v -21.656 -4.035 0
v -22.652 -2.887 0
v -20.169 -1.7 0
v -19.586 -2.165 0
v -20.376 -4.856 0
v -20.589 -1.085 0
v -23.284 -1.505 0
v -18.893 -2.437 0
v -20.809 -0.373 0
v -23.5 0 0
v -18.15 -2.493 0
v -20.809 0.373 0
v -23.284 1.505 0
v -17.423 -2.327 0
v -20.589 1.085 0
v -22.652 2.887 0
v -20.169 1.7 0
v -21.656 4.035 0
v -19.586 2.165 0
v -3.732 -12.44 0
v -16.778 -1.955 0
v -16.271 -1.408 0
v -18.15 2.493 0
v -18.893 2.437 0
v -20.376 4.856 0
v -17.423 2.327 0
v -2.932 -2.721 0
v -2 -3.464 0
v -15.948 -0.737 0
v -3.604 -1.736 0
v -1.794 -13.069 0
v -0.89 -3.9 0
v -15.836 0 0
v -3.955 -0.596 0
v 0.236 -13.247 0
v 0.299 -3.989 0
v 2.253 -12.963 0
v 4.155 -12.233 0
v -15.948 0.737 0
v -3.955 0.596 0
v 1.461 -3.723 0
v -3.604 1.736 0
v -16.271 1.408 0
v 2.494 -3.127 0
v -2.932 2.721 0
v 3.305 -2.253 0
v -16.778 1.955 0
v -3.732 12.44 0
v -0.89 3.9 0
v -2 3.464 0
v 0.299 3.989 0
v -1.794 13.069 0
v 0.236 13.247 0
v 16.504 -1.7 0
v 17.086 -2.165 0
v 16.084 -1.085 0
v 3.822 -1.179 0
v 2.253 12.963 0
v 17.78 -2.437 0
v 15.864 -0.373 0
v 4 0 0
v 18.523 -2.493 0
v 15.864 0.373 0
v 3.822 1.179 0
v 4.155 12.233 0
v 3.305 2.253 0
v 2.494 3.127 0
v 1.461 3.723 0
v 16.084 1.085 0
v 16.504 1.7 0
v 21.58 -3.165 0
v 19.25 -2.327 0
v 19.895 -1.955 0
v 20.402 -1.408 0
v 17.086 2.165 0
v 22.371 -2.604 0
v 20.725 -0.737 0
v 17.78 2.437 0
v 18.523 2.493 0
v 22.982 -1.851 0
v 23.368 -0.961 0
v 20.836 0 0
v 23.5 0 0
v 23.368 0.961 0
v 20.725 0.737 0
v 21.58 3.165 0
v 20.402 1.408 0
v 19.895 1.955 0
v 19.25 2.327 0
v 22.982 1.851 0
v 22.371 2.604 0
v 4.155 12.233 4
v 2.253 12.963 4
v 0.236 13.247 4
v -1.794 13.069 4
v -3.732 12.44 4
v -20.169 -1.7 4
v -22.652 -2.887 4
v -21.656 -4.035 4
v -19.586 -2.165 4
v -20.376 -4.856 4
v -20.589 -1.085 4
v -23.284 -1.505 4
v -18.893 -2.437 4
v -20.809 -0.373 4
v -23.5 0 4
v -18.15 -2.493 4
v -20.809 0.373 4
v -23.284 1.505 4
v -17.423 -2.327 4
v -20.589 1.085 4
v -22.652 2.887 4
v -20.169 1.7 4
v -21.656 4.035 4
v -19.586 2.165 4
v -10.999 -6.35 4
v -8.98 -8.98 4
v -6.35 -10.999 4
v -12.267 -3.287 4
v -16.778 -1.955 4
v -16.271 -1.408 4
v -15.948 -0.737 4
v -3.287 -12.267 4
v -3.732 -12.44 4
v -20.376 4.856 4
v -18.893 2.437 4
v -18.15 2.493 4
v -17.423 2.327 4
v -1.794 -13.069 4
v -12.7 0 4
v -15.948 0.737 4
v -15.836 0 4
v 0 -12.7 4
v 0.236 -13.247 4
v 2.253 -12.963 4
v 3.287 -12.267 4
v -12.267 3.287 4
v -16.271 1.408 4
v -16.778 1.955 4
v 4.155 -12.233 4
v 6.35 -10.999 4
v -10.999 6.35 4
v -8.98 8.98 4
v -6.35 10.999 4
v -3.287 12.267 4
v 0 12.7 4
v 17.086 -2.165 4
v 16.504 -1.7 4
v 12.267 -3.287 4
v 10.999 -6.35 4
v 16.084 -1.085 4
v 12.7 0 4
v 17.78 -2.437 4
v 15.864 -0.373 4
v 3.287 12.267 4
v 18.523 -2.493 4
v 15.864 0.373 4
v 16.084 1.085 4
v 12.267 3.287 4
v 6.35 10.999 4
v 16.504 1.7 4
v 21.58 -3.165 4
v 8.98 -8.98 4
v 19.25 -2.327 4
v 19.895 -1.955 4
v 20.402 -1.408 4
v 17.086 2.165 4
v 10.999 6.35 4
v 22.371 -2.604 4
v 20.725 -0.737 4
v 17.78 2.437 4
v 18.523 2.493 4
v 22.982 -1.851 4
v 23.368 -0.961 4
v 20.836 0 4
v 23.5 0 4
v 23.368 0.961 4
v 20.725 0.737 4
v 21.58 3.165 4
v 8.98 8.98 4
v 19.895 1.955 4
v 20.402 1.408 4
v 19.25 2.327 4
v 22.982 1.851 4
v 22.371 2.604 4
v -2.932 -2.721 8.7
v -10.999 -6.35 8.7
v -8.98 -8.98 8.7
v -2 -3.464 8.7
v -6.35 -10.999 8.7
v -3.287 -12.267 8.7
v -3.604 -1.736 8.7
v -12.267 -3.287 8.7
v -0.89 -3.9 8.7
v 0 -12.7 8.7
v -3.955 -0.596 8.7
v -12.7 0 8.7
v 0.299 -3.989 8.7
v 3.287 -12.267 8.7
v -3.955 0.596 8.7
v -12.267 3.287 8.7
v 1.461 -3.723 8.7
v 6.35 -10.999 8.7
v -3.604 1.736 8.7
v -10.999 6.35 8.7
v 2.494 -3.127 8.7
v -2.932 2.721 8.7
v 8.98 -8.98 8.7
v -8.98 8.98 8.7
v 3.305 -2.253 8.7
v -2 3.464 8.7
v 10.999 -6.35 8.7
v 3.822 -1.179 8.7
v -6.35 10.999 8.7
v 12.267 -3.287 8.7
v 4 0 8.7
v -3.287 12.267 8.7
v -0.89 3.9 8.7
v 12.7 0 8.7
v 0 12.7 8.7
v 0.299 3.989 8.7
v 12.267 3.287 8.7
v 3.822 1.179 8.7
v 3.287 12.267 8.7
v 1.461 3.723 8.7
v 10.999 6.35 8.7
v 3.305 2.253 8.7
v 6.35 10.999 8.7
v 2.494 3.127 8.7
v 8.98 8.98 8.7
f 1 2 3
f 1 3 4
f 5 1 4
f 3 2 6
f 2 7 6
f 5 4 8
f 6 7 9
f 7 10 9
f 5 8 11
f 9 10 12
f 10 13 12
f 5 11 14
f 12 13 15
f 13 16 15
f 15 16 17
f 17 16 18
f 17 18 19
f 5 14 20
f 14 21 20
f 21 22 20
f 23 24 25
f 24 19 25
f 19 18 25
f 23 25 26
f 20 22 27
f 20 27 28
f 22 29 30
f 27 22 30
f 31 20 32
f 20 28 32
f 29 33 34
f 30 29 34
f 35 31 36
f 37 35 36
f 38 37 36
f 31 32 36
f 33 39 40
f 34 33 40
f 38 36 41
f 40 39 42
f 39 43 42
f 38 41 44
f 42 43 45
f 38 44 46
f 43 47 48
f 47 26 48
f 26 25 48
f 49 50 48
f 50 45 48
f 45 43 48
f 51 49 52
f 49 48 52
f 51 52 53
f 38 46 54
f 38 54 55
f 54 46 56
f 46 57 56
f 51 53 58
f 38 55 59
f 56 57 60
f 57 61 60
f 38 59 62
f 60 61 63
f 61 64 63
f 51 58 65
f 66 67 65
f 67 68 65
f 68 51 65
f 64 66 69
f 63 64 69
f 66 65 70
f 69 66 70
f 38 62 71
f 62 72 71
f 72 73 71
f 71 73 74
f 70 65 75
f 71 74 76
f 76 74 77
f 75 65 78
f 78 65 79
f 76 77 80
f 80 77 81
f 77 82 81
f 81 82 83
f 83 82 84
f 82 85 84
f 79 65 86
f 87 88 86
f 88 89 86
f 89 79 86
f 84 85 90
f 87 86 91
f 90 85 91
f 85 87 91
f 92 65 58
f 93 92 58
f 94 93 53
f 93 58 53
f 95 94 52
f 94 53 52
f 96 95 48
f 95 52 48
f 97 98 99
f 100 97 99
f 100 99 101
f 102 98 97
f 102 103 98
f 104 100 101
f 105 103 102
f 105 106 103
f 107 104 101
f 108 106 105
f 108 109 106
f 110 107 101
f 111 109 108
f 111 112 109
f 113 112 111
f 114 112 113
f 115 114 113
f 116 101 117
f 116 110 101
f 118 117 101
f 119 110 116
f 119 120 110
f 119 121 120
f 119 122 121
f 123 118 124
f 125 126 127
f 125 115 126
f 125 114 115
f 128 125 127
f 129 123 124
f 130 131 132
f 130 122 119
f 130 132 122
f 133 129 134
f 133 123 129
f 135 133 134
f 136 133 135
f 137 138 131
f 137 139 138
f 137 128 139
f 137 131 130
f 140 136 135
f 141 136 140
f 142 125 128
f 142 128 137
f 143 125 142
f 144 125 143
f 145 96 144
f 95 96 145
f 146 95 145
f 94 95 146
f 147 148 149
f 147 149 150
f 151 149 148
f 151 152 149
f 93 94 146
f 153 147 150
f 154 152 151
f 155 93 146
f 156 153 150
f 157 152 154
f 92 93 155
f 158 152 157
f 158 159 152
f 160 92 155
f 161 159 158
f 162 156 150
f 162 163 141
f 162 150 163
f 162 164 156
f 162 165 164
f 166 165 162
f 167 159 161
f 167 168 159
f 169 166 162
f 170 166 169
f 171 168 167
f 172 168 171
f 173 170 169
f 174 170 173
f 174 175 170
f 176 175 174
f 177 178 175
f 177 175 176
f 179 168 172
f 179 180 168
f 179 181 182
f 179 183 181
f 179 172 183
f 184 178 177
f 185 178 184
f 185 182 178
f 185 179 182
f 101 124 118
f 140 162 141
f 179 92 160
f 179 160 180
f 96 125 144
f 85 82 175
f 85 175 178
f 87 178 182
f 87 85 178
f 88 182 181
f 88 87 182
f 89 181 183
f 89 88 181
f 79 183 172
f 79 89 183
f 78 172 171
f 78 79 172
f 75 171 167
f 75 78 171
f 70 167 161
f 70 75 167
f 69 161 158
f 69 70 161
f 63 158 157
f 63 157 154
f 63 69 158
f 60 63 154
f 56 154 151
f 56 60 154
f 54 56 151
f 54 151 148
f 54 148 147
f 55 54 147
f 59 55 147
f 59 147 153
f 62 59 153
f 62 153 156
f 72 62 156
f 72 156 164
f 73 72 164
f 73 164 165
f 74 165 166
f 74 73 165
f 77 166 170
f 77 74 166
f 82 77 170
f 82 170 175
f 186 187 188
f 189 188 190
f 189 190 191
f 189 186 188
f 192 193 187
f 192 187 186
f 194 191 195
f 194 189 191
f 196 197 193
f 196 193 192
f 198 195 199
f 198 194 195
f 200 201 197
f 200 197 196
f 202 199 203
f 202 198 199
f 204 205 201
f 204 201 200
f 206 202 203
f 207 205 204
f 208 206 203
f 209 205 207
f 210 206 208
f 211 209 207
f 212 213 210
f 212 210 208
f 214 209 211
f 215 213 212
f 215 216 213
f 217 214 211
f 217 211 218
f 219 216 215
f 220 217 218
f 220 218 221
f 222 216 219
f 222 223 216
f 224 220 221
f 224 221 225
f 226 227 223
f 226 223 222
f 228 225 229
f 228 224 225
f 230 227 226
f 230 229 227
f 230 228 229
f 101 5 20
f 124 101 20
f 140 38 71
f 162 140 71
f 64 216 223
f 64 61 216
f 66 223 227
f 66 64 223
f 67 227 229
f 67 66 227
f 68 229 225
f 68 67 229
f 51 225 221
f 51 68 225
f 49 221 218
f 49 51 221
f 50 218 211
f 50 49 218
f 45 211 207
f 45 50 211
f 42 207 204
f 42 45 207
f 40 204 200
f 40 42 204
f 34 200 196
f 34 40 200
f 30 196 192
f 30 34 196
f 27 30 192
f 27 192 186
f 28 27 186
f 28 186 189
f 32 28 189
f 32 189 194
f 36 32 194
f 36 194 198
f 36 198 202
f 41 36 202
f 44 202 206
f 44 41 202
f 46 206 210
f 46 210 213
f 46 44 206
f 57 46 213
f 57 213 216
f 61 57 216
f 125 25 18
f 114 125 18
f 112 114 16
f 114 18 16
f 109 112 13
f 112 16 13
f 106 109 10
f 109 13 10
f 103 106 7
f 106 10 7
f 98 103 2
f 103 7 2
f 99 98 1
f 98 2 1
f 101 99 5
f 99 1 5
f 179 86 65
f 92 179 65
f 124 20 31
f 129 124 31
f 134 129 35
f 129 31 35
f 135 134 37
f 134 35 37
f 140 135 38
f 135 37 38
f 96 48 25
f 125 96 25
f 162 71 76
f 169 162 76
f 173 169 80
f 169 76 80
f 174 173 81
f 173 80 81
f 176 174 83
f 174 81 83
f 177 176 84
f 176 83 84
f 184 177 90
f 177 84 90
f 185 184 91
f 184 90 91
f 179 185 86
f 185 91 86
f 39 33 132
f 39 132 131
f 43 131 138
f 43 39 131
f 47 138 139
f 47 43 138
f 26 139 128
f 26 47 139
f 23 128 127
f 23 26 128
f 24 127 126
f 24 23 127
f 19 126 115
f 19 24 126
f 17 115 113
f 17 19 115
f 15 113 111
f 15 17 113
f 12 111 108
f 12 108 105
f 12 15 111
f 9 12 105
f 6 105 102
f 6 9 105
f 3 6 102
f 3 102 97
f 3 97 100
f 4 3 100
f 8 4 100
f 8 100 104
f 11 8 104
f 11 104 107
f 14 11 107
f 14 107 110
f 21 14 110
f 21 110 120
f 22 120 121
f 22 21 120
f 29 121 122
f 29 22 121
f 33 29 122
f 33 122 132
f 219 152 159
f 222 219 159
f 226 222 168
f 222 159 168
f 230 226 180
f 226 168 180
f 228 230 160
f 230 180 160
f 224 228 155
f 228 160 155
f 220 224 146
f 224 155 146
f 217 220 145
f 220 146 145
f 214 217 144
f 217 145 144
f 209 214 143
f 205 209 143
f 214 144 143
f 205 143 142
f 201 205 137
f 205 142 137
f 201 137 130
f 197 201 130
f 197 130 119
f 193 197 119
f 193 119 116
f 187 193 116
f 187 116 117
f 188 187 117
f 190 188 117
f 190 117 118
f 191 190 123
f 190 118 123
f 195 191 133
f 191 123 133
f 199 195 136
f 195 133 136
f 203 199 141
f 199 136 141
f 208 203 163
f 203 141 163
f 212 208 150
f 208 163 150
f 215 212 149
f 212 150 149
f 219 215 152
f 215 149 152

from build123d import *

# Parameters (mm, degrees)
SKETCH_R      = 4
SKETCH_R_2    = 2.5
PAD_DEPTH     = 4
SKETCH001_R   = 12.7
SKETCH001_R_2 = 4
PAD001_DEPTH  = 4.7


with BuildPart() as part:
    # Sketch → Pad (new body)
    with BuildSketch(Plane.XY):
        with BuildLine():
            Line((-20.376172, -4.856123), (-3.731608, -12.439939))
            ThreePointArc((-3.731608, -12.439939), (0.235589, -13.246916), (4.155117, -12.233421))
            Line((4.155117, -12.233421), (21.579522, -3.164572))
            ThreePointArc((21.579522, -3.164572), (23.5, 0), (21.579522, 3.164572))
            Line((21.579522, 3.164572), (4.155117, 12.233421))
            ThreePointArc((4.155117, 12.233421), (0.235589, 13.246916), (-3.731608, 12.439939))
            Line((-3.731608, 12.439939), (-20.376172, 4.856123))
            ThreePointArc((-20.376172, 4.856123), (-23.5, 0), (-20.376172, -4.856123))
        make_face()
        Circle(SKETCH_R, mode=Mode.SUBTRACT)
        with Locations((-18.336439, 0)):
            Circle(SKETCH_R_2, mode=Mode.SUBTRACT)
        with Locations((18.336439, 0)):
            Circle(SKETCH_R_2, mode=Mode.SUBTRACT)
    extrude(amount=PAD_DEPTH)

    # Sketch001 → Pad001 (new body)
    with BuildSketch(Plane.XY.offset(4)):
        Circle(SKETCH001_R)
        Circle(SKETCH001_R_2, mode=Mode.SUBTRACT)
    extrude(amount=PAD001_DEPTH)


solid = part.part
